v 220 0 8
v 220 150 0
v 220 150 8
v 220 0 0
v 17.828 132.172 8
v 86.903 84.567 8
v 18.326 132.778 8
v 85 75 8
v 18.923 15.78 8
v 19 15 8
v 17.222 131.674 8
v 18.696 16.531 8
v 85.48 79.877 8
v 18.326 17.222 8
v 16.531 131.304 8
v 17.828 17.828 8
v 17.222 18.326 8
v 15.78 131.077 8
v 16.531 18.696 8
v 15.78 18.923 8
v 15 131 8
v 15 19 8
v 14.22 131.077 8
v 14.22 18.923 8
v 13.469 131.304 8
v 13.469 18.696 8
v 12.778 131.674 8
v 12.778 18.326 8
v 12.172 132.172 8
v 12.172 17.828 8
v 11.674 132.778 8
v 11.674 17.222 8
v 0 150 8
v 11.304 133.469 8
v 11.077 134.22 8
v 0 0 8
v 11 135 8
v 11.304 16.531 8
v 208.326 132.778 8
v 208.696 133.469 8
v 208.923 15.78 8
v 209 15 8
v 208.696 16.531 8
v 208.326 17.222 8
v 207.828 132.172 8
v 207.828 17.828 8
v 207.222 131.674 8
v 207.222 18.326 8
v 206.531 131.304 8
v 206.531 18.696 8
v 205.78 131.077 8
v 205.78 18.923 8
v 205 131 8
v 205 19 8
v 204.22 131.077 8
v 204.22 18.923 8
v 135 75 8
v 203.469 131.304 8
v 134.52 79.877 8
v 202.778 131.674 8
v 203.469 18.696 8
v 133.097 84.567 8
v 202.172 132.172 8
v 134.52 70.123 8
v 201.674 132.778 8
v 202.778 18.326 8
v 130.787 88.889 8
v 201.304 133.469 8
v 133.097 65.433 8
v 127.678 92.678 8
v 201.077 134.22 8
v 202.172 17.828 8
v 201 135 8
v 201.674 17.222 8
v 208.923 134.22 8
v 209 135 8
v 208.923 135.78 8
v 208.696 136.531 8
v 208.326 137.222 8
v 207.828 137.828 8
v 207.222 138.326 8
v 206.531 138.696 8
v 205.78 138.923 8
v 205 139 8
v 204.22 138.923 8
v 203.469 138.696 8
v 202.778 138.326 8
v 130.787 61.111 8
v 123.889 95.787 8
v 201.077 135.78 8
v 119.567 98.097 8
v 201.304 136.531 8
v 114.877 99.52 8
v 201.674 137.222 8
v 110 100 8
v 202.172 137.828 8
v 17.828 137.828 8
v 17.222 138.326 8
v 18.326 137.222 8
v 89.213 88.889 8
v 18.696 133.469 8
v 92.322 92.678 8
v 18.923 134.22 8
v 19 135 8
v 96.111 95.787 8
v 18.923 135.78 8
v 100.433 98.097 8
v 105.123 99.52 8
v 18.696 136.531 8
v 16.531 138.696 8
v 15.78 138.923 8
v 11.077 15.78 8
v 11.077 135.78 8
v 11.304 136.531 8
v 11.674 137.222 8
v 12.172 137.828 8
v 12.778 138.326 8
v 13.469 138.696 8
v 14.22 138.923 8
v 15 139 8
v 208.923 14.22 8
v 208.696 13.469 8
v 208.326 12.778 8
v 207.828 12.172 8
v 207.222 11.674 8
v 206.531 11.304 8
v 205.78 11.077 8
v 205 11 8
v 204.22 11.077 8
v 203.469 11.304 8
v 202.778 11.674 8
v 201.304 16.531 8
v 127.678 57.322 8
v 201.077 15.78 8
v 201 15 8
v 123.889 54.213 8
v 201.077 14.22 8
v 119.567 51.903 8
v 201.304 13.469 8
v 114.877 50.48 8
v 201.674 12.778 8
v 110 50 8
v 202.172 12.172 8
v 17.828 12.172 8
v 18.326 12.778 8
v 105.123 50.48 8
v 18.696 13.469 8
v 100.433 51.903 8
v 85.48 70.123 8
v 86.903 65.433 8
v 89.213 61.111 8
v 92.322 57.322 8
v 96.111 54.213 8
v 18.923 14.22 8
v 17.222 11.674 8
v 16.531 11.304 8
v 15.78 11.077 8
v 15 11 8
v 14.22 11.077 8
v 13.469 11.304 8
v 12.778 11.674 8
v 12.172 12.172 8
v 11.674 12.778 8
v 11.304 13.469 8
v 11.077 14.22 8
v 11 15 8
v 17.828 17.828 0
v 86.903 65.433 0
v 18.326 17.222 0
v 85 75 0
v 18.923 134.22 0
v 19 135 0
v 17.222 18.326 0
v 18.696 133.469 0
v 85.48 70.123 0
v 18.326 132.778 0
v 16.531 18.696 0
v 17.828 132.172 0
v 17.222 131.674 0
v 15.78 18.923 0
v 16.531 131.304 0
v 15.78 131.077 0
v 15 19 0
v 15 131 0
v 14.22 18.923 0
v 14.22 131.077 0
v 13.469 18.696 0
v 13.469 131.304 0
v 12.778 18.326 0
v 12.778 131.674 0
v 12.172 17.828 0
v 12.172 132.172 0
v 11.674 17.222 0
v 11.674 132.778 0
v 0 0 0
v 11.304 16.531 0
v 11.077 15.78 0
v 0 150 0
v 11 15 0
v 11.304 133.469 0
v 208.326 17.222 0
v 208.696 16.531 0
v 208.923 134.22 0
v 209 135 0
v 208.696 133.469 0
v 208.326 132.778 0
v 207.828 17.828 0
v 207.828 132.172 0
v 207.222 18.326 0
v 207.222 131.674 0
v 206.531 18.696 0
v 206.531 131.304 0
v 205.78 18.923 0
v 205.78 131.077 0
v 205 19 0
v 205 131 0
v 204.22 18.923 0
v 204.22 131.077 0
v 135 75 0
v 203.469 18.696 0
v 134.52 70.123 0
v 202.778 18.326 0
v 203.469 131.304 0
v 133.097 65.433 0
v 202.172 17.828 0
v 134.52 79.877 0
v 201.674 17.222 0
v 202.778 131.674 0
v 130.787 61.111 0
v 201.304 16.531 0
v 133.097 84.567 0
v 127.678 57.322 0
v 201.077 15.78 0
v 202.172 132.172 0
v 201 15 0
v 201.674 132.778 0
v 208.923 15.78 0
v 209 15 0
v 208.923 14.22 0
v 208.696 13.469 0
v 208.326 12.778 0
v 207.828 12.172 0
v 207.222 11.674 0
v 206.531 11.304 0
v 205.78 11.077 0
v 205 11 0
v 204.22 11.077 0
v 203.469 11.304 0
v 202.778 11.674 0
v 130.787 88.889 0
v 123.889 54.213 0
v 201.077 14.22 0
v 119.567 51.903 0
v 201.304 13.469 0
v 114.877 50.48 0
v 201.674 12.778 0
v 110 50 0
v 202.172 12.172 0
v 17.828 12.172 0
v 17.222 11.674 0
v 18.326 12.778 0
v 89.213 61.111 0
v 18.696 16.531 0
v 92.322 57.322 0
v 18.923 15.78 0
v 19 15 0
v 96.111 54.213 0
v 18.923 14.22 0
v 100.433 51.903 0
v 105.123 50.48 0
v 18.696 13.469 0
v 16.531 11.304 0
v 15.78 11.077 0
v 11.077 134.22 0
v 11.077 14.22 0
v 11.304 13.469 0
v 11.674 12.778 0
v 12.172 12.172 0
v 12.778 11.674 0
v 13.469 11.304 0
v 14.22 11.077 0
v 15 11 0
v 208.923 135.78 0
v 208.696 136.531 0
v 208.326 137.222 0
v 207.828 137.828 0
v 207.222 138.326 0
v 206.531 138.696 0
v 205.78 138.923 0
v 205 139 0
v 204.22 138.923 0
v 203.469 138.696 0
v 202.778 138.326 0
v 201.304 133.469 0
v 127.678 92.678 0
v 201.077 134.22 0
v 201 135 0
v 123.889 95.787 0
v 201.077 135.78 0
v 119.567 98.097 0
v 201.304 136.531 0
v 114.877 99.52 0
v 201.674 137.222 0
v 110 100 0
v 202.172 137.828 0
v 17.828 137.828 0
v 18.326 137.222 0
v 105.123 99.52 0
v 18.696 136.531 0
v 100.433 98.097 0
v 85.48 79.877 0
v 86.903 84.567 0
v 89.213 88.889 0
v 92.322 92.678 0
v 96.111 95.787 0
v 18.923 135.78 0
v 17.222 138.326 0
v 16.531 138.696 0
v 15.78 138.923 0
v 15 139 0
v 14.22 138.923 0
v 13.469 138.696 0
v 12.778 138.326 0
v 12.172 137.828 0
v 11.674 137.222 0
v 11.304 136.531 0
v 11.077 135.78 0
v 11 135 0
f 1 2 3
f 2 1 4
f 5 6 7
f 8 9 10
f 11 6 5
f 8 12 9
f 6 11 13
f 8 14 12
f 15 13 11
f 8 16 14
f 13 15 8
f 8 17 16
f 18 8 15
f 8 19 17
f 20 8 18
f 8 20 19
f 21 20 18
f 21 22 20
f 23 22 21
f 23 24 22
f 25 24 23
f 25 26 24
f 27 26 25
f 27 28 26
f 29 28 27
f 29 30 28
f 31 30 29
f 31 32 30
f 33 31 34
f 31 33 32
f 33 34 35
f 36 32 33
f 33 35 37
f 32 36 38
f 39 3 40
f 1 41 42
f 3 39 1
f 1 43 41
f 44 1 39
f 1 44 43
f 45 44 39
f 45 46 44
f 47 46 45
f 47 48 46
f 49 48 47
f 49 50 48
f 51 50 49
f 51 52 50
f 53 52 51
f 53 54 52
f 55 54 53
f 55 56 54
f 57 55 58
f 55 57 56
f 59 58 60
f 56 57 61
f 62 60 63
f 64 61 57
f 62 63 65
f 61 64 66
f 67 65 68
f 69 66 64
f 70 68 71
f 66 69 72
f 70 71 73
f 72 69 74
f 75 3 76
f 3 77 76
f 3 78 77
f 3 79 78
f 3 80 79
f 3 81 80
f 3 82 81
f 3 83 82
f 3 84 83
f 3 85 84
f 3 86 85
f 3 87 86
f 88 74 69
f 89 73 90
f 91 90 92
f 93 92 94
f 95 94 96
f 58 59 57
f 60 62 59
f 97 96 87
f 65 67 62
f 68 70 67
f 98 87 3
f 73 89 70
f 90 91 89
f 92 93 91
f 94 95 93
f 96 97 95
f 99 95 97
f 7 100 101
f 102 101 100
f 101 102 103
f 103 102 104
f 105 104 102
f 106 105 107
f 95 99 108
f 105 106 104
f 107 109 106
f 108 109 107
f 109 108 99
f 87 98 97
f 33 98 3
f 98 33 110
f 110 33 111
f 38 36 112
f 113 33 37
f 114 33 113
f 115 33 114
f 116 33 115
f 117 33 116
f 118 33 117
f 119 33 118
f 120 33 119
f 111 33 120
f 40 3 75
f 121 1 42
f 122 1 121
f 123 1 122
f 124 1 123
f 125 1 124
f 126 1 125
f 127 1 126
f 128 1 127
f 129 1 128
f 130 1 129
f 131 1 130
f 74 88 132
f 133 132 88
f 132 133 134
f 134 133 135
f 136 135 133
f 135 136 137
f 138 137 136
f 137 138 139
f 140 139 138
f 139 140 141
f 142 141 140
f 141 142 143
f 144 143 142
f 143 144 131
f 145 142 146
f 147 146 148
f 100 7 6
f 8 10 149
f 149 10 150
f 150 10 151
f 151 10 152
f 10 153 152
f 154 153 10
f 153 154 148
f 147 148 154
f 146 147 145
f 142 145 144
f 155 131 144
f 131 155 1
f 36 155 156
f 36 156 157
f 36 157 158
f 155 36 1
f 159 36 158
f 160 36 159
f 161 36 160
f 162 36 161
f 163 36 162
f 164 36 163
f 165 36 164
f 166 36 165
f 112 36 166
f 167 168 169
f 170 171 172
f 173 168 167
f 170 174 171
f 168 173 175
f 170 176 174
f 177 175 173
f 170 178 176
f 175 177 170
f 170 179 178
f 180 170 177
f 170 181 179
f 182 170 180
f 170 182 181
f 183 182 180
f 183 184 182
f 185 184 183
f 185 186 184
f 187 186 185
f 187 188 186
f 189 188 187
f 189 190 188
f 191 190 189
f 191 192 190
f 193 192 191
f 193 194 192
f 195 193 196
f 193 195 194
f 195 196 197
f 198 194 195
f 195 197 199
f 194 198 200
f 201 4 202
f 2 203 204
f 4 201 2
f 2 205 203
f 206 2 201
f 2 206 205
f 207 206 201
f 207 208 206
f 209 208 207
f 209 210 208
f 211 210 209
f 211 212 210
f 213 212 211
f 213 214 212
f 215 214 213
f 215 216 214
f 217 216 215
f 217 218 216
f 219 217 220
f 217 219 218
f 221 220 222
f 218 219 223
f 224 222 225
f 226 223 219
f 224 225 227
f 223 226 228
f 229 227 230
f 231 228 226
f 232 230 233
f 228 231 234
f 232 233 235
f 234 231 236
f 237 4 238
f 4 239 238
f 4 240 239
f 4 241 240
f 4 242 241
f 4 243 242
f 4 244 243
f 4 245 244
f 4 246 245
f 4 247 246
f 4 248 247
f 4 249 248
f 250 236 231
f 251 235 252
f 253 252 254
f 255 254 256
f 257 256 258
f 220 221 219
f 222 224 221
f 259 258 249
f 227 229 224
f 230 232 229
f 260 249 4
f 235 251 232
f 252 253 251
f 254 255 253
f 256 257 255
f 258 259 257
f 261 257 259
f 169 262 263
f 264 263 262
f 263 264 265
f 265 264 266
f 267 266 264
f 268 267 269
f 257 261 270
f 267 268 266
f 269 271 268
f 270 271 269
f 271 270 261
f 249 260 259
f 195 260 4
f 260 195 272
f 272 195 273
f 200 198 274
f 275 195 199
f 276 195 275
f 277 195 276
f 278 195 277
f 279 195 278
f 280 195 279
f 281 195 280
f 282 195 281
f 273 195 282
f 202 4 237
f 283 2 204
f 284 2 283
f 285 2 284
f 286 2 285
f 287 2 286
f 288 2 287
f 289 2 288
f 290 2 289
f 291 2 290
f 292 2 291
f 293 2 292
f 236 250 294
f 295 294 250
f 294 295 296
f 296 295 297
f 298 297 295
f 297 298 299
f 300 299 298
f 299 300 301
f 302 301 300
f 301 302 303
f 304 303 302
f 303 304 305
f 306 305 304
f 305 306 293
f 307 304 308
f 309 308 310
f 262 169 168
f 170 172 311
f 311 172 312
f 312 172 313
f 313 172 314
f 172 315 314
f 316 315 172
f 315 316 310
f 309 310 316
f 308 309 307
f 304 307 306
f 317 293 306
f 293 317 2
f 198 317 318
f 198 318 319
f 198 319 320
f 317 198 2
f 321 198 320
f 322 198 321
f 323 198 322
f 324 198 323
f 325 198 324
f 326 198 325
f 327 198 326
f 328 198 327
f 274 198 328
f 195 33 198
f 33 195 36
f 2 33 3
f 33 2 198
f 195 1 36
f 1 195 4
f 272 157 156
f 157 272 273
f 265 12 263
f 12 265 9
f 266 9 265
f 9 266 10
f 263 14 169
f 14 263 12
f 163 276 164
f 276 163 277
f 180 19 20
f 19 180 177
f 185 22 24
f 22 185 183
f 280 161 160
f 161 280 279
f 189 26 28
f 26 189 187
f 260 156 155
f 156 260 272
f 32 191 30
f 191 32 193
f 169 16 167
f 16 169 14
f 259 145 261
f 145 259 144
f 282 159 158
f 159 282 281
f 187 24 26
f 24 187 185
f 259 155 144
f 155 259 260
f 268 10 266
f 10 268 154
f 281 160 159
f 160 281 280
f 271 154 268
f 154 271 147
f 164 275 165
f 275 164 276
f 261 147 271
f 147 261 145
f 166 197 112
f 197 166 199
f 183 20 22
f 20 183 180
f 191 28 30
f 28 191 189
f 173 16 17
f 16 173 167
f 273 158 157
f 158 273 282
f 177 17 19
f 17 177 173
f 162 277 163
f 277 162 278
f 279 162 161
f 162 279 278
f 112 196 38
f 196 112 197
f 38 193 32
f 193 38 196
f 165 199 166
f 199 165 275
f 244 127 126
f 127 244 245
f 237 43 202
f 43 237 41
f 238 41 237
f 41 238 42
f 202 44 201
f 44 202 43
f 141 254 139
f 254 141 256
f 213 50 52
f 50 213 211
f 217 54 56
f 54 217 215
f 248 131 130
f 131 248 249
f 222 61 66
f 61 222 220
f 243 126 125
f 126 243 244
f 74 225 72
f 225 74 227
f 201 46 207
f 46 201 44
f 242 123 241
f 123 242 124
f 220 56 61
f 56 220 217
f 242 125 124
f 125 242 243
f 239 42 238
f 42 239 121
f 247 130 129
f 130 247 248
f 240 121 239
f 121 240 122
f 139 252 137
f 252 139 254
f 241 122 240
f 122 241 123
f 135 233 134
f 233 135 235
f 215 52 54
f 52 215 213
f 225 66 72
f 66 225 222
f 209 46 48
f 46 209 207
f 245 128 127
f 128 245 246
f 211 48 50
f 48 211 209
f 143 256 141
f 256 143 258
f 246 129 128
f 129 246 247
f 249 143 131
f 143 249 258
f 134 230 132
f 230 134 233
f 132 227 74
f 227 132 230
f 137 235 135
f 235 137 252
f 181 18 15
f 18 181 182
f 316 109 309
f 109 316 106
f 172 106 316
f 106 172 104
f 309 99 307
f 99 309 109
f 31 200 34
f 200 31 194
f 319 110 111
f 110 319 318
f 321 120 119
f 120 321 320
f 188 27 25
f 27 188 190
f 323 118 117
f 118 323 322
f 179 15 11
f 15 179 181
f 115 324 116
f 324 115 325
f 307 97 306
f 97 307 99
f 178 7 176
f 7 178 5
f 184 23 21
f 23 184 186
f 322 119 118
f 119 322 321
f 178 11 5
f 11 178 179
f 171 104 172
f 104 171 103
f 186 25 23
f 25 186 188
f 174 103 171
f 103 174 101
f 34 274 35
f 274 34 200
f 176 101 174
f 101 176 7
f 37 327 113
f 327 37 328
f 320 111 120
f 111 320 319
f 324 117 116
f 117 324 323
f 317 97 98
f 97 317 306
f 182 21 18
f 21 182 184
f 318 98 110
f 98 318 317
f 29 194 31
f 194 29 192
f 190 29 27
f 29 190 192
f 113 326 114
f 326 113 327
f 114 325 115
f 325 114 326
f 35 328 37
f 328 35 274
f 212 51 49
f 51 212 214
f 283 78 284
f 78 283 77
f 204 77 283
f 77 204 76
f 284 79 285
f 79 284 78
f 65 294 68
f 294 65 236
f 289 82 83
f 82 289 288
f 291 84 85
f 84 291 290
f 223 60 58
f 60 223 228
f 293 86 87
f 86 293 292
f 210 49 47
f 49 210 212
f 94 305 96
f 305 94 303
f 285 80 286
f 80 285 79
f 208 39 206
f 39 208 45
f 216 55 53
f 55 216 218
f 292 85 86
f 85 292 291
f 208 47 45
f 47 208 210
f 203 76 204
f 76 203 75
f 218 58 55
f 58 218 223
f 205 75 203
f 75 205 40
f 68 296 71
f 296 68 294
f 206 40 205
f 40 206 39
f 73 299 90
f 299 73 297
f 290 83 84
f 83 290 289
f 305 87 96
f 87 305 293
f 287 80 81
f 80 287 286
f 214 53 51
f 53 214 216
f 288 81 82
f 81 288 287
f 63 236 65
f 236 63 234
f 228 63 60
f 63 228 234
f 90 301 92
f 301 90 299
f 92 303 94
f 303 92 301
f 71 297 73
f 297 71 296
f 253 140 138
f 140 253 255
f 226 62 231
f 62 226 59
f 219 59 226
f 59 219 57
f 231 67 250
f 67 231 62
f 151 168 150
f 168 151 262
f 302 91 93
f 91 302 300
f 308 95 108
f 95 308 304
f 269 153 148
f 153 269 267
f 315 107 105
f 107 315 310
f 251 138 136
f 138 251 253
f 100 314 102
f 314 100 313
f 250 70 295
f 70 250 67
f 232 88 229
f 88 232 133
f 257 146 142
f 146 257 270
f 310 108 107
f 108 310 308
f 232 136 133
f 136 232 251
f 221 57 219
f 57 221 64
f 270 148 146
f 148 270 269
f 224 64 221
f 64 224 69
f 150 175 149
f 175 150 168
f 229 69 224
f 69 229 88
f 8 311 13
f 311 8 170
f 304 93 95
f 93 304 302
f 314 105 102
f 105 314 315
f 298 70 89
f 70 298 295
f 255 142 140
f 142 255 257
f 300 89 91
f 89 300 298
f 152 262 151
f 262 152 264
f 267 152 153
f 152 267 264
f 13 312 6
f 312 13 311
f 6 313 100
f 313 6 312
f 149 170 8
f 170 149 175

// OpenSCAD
$fn = 32;

// ----------------------------------------------------------------------
// Big plate: 200-250 mm adapter plate
// ----------------------------------------------------------------------

// --- parameters (mm) ---
plate_l = 220;            // plate length, X
plate_w = 150;            // plate width, Y
plate_t = 8;              // plate thickness, Z
corner_d = 8;             // corner hole diameter
corner_in = 15;           // corner hole inset from the edges
bore_d = 50;              // central bore

difference() {
  cube([plate_l, plate_w, plate_t]);
  translate([corner_in, corner_in, -1]) cylinder(h = plate_t + 2, d = corner_d);
  translate([plate_l - corner_in, corner_in, -1]) cylinder(h = plate_t + 2, d = corner_d);
  translate([corner_in, plate_w - corner_in, -1]) cylinder(h = plate_t + 2, d = corner_d);
  translate([plate_l - corner_in, plate_w - corner_in, -1]) cylinder(h = plate_t + 2, d = corner_d);
  translate([plate_l / 2, plate_w / 2, -1]) cylinder(h = plate_t + 2, d = bore_d);
}
